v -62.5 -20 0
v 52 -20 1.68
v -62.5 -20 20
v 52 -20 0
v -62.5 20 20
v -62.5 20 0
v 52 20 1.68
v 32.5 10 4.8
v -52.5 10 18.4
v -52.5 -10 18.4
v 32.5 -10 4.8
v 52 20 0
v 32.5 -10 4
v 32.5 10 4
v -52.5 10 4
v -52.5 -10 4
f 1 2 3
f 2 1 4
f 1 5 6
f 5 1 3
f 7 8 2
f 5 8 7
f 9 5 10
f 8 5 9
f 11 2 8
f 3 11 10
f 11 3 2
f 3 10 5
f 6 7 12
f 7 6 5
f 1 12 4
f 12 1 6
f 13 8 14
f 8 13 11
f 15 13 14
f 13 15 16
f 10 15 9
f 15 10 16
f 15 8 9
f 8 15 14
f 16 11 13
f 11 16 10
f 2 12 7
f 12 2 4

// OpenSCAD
/*
Door stopper

Author:
- Daniel K. Schneider, TECFA, University of Geneva, April 2010

Copyright and credits:
- Attribution - Non-Commercial - Share Alike license.
  (http://creativecommons.org/licenses/by-nc-sa/3.0/)

Purpose:
- Stops doors from banging when it is windy :)
- Offer it as a 3D visiting card, publicity for programs, etc.

Usage:
- Add some text on top of the flat area. E.g. use Netfabb to create and to position the 3D letters, then merge with Meshlab (or buy Netfabb Pro).
- Add text underneath, or use the door_stopper_simple () module. Text underneath should stretch in both the x/y directions ! Else you will have too much overhang.
- I recommend using a fat, round font like Arial Rounded MT Bold
- For some kinds of buildings, you may have to adapt the openscad code, i.e. you can make it less high or higher...

Printing with the rapman / skeinforge
- Printing is *much* easier with PLA since it doesn't warp, but PLA is not as solid as ABS.
- ABS will probably warp, so:
-- take the print bed off and sand it again
-- make a really sticky and large raft (3mm thickness and 15 mm extra margin) and print it slowly !
-- even then, be prepared to file away the rounded bottom or if it warps just be bit, accept that it will be rounded since that hasn't much impact on door stopping ;)
-- use a fan maybe, but then raise all temperatures by 5 or more (depending on how much your ventilator will cool), e.g. 243 for the raft and 256 for the rest.
- Use a good infill if you want it solid, e.g. 25 %
- Flow rate: about 450

*/ 


// ------------------------- Pick your module
// Comment/uncomment one

// door_stopper ();
door_stopper_simple ();

// -------------------------- door stopper with text underneath 

module door_stopper ()
{
    height = 25  ;
    length = 135 ;
    width= 62 ;
    half_width  = width / 2;
    
    borders = 10; // 1 cm on each side

    bottom_cube_length = length - 4.5 * borders;
    bottom_cube_width = width - 2 * borders;
    bottom_cube_height = 6.0 ; // 3mm in / 3mm outsite
    bottom_z = 0;

    top_cube_length = length - 4 * borders;
    top_cube_width  = width - 2 * borders;
    top_cube_height = height ;  // make it big enough
    top_z = height/2 + 8 ; // adjust manually ;)

    tip_cut_pos = length/2 - 0.5;

    difference() {
	translate ([-length/2.0, 0, 0]) {
    	    polyhedron (	
	    		points = [[0, -half_width, height], [0, half_width, height], [0, half_width, 0], [0, -half_width, 0], [length, -half_width, 0], [length, half_width, 0]],
			triangles = [[0,3,2], [0,2,1], [3,0,4], [1,2,5], [0,5,4], [0,1,5],  [5,2,4], [4,2,3], ]);
	}
	// bottom inset
	translate ([-1 * borders, 0, bottom_z]) {
	    # cube ([bottom_cube_length,
		     bottom_cube_width,
		     bottom_cube_height],
		    center=true) ;
	}
	// top inset
	translate ([-1 * borders, 0, top_z]) {
	    # cube ([top_cube_length,
		     top_cube_width,
		     top_cube_height],
		    center=true) ;
	}
	// cut of the tip a bit

	translate ([tip_cut_pos, 0, 0]) {
	    cube ([20,
		     width + 1,
		     height],
		    center=true) ;
	}
    }	    
}


// -------------------------- door stopper without text underneath 

module door_stopper_simple ()
{
    height = 20  ;
    length = 125 ;
    width= 40 ;
    half_width  = width / 2;
    
    borders = 10; // 1 cm on each side

    top_cube_length = length - 4 * borders;
    top_cube_width  = width - 2 * borders;
    top_cube_height = height ;  // make it big enough
    top_z = height/2 + 4 ; // adjust manually ;)

    tip_cut_pos = length/2 - 0.5;

    difference() {
	translate ([-length/2.0, 0, 0]) {
    	    polyhedron (	
	    		points = [[0, -half_width, height], [0, half_width, height], [0, half_width, 0], [0, -half_width, 0], [length, -half_width, 0], [length, half_width, 0]],
			triangles = [[0,3,2], [0,2,1], [3,0,4], [1,2,5], [0,5,4], [0,1,5],  [5,2,4], [4,2,3], ]);
	}

	// top inset
	translate ([-1 * borders, 0, top_z]) {
	    # cube ([top_cube_length,
		     top_cube_width,
		     top_cube_height],
		    center=true) ;
	}
	// cut of the tip a bit

	translate ([tip_cut_pos, 0, 0]) {
	    # cube ([20,
		     width + 1,
		     height],
		    center=true) ;
	}
    }
}
